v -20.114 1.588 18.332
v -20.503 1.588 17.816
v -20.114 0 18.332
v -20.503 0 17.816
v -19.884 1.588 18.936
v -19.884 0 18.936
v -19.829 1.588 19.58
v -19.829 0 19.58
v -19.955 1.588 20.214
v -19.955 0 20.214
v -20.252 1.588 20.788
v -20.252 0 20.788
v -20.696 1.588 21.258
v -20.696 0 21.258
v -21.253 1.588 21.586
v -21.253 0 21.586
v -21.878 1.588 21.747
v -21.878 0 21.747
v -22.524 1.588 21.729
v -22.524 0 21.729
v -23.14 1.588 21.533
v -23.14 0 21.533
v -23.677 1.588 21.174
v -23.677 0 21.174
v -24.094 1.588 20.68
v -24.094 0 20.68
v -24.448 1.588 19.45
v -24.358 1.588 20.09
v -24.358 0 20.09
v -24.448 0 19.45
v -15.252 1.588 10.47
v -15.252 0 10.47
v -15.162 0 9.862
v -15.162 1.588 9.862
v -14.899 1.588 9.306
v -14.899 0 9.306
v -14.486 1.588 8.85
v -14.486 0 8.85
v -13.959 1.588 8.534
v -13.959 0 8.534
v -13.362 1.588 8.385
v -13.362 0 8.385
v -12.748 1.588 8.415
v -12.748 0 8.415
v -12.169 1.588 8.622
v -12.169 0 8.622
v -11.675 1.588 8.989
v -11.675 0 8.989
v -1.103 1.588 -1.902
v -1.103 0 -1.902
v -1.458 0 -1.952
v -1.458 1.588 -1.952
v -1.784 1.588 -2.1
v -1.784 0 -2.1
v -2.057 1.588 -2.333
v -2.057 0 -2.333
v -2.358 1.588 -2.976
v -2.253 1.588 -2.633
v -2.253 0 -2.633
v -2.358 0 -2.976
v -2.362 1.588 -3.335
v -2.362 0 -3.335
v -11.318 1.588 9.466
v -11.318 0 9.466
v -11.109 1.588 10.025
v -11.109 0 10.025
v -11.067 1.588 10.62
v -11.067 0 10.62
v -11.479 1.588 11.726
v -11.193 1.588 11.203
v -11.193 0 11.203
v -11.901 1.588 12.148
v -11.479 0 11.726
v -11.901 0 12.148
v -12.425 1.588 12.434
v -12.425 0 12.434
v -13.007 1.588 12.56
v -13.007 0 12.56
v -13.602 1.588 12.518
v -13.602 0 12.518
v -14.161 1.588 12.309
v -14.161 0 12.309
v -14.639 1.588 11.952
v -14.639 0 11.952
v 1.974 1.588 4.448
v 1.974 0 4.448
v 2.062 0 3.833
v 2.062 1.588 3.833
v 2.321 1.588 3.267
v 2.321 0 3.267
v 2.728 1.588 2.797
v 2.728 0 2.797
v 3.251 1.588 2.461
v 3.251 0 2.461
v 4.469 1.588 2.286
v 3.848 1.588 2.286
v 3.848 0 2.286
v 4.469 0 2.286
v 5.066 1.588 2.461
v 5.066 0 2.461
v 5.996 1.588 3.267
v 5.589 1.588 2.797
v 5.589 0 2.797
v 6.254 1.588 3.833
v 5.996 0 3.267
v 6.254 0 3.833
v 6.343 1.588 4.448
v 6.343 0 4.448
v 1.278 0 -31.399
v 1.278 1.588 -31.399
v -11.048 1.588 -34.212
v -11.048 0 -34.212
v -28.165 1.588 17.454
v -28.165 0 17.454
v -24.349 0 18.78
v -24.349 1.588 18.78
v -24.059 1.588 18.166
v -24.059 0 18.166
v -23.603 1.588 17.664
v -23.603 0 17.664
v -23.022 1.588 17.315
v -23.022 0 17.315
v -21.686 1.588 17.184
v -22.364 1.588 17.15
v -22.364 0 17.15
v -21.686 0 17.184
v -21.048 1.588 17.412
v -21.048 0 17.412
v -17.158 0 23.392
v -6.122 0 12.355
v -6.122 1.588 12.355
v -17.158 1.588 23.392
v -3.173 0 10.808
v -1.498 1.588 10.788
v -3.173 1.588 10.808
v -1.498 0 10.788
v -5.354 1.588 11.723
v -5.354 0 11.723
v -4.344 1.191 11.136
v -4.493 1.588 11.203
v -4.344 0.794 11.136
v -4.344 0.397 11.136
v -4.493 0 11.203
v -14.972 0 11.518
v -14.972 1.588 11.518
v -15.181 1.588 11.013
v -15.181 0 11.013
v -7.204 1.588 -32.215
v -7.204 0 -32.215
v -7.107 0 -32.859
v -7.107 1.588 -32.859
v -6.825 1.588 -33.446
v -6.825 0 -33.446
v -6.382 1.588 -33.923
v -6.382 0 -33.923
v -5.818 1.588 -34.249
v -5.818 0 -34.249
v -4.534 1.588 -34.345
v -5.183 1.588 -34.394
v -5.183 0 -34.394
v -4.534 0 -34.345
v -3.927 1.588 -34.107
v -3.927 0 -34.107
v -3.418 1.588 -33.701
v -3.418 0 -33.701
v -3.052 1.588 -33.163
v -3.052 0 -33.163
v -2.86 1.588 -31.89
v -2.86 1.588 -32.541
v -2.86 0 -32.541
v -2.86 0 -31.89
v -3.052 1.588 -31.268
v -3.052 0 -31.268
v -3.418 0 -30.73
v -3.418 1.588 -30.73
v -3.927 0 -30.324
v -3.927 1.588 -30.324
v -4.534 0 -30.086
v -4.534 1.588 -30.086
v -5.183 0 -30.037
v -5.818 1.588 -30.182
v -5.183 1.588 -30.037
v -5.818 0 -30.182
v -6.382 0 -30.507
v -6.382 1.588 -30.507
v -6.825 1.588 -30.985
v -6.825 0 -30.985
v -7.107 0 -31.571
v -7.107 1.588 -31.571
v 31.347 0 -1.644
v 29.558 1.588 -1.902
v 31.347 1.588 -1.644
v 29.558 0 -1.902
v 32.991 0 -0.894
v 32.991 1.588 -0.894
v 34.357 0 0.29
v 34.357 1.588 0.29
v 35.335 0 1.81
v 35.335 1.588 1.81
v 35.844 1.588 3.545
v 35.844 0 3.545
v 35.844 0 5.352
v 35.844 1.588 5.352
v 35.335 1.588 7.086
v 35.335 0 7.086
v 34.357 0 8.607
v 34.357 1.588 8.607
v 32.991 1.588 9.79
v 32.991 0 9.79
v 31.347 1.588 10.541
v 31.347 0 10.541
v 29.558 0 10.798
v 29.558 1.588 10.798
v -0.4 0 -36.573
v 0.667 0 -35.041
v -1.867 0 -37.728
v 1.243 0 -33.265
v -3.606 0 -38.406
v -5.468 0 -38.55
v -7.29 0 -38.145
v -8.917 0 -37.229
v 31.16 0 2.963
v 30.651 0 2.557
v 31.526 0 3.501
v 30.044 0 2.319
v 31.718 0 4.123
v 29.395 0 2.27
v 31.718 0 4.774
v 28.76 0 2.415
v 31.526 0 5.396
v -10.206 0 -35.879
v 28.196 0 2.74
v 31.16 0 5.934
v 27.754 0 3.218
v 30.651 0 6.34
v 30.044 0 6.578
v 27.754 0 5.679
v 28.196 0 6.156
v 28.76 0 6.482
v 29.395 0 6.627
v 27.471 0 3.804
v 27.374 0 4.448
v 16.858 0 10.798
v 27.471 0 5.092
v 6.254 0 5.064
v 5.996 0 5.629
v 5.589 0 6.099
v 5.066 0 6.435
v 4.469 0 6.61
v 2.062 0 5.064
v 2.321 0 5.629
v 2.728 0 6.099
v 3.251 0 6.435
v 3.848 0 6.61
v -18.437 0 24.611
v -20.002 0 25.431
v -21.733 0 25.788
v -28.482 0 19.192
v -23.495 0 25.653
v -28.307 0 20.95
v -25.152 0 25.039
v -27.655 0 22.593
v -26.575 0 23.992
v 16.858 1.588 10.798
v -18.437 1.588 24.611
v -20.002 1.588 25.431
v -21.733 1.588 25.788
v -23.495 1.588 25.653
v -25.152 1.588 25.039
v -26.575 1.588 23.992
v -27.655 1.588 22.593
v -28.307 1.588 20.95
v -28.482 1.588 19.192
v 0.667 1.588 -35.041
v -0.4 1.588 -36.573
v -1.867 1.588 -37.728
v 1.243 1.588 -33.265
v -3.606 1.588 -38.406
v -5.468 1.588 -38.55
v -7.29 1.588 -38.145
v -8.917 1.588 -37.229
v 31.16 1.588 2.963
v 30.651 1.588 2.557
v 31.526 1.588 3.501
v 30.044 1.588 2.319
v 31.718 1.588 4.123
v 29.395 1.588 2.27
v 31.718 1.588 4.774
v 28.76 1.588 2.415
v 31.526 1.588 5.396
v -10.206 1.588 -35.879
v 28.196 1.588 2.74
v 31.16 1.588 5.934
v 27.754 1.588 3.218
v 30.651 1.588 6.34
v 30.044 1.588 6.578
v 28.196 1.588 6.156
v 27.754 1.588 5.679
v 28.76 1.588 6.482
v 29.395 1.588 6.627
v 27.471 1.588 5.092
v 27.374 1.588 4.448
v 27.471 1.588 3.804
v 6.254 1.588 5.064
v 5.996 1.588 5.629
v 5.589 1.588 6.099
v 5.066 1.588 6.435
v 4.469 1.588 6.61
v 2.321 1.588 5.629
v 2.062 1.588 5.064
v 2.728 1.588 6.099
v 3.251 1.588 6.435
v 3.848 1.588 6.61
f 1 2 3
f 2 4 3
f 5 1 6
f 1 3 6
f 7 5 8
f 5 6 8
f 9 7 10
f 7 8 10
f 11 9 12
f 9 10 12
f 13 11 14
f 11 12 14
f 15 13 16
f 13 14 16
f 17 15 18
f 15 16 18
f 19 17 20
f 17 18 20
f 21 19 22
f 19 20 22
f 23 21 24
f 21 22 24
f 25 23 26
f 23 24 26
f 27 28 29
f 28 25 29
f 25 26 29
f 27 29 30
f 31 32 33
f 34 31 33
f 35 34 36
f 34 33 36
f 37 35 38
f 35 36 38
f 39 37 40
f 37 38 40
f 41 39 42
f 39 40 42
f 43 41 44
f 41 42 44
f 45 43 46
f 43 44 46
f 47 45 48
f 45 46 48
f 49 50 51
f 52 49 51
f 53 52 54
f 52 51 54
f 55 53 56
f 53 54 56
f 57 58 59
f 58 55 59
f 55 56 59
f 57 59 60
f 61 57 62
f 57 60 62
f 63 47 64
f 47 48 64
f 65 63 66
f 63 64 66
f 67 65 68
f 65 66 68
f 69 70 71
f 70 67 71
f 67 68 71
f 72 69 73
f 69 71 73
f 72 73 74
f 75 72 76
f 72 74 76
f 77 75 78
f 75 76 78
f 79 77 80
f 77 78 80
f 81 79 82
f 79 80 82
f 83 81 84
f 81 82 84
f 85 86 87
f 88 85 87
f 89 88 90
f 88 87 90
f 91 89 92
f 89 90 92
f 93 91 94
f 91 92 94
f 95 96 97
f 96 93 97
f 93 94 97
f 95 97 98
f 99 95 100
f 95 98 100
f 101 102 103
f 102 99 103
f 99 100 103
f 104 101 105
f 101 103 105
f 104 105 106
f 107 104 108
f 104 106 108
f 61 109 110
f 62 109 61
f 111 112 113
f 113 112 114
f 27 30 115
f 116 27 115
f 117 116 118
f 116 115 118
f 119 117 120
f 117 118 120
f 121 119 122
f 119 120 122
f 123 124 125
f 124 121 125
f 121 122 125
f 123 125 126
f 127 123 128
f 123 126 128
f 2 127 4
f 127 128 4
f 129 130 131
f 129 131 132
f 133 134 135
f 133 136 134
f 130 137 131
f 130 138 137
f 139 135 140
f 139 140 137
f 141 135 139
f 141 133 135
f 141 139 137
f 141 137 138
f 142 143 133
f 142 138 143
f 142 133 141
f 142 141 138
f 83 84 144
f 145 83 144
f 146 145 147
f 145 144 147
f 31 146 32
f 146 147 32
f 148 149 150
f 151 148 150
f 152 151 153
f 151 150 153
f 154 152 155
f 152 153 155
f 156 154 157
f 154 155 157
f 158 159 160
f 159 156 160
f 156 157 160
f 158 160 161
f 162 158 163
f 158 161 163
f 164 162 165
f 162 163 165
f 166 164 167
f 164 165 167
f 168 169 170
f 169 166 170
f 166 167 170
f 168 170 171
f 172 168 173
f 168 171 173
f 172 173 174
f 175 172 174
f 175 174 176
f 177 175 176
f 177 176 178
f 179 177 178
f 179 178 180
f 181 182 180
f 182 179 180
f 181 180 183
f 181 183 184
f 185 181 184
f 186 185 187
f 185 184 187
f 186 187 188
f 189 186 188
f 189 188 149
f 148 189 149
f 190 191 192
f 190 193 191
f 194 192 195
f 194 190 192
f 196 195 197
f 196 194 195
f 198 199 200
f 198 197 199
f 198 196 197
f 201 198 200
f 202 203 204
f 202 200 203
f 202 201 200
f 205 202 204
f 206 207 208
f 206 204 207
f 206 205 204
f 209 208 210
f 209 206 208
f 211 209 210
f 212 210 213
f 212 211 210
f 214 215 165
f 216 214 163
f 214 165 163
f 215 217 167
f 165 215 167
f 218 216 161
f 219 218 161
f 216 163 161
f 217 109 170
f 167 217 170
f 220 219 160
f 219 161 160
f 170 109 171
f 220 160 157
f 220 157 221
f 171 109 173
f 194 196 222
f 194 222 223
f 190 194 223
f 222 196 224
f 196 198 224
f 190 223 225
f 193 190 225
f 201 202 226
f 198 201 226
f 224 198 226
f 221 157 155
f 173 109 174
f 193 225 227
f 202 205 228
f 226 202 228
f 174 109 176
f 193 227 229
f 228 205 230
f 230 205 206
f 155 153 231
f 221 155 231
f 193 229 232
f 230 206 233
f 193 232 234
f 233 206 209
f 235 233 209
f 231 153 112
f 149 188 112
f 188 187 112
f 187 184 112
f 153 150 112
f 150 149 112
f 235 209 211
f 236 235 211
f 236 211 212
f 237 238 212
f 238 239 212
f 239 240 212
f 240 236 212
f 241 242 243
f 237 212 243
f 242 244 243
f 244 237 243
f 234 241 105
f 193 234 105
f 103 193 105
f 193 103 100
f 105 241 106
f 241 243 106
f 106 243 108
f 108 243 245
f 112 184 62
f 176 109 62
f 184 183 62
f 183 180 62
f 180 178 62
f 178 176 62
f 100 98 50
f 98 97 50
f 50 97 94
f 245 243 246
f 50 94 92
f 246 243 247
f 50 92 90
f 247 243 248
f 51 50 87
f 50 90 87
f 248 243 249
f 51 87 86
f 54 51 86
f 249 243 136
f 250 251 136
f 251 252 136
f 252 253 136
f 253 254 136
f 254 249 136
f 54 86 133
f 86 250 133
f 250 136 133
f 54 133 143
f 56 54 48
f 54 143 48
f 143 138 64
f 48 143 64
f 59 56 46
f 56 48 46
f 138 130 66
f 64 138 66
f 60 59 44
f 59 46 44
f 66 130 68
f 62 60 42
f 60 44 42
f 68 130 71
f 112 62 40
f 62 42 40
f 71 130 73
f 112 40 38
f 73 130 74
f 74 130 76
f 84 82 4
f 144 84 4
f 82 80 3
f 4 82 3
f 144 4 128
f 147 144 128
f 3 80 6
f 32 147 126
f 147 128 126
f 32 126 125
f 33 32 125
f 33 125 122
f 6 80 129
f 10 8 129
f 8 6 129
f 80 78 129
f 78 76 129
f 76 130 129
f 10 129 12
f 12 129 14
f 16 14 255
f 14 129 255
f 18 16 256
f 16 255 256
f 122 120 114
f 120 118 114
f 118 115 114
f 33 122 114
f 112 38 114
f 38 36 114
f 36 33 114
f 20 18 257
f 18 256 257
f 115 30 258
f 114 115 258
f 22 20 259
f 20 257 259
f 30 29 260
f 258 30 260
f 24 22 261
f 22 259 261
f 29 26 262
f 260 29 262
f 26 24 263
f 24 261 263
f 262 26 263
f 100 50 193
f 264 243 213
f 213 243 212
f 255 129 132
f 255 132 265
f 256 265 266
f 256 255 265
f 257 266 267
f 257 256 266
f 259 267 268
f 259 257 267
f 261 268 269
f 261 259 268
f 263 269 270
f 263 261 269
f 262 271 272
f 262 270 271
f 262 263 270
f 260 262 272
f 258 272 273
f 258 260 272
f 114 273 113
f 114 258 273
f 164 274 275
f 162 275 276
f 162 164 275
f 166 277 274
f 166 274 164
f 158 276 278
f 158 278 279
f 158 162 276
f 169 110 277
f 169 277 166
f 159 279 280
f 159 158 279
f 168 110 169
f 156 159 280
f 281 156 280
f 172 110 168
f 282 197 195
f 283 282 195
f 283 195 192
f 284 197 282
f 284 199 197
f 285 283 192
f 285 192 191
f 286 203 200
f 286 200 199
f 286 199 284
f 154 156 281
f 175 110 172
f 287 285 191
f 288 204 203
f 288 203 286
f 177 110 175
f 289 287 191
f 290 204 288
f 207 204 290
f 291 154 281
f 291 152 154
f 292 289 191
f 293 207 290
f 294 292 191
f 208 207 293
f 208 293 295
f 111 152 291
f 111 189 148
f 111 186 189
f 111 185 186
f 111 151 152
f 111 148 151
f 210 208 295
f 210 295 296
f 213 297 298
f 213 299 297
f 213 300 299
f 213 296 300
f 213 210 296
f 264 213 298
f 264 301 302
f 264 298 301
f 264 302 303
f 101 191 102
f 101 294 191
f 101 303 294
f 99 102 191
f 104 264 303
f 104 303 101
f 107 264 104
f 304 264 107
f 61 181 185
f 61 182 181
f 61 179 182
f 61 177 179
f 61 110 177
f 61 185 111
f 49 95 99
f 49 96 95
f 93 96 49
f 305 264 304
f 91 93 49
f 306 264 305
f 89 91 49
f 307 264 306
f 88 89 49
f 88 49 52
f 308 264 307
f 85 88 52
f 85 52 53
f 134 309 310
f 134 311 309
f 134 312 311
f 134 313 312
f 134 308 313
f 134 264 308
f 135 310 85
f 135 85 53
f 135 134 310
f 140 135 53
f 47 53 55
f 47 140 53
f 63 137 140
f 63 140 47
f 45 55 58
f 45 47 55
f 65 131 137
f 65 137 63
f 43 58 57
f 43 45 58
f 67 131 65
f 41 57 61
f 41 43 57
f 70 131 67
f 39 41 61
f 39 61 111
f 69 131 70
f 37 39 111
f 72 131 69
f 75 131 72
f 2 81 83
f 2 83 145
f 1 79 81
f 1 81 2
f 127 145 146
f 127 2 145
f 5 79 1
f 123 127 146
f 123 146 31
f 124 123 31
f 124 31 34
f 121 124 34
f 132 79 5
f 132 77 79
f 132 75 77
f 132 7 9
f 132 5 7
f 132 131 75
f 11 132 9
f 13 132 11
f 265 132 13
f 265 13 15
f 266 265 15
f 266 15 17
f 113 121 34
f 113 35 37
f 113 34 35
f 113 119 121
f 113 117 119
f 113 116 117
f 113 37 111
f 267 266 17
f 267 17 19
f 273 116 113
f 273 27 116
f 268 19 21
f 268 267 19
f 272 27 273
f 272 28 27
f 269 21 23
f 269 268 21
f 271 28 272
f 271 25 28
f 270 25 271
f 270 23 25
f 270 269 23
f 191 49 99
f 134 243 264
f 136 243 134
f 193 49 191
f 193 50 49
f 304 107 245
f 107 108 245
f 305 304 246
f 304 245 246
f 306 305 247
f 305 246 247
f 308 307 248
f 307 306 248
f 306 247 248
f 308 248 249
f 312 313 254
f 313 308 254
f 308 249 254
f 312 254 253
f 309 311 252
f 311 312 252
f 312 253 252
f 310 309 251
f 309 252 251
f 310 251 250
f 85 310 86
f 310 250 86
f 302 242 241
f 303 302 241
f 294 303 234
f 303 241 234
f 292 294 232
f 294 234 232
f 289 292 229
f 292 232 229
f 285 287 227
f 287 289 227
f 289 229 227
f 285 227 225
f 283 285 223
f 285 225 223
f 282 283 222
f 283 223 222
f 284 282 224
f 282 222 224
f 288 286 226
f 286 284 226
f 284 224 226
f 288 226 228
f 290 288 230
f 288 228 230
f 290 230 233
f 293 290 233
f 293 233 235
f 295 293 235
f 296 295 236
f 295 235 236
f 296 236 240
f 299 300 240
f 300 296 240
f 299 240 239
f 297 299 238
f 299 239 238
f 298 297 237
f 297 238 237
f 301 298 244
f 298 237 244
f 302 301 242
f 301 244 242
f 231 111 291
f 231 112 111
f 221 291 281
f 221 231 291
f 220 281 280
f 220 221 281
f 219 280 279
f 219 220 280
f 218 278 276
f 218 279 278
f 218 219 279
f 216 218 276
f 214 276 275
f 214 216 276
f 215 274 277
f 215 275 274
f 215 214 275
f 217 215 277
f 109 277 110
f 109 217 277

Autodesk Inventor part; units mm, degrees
ref_plane "YZ Plane" through (0, 0, 0) normal (1, 0, 0) x (0, 1, 0)
ref_plane "XZ Plane" through (0, 0, 0) normal (0, 1, 0) x (-1, 0, 0)
ref_plane "XY Plane" through (0, 0, 0) normal (0, 0, 1) x (1, 0, 0)
sketch "main" plane through (0, 0, 0) normal (0, 0, 1) x (1, 0, 0)
  circle A0 centre (38.7007, 32.2161) radius 2.3114
  circle A1 centre (29.7205, 23.2358) radius 2.3114
  circle A2 centre (13.1029, 17.5349) radius 2.1844
  circle A3 centre (22.281, -19.1287) radius 2.1844
  circle A4 centre (22.281, -19.1287) radius 6.35
  spline S0 degree 3 poles (34.2106, 36.7062) (34.5464, 37.0421) (35.2145, 37.7033) (36.4253, 38.4715) (37.8969, 38.8878) (39.5045, 38.8877) (40.9769, 38.4718) (42.187, 37.7033) (42.855, 37.0421) (43.1908, 36.7062) knots 0 0 0 0 0.123366 0.246731 0.370097 0.493463 0.616828 0.740194 0.86356 0.86356 0.86356 0.86356
  spline S1 degree 3 poles (43.1908, 36.7062) (43.5267, 36.3703) (44.188, 35.7023) (44.9562, 34.4914) (45.3725, 33.0199) (45.3723, 31.4123) (44.9564, 29.9399) (44.1879, 28.7298) (43.5267, 28.0618) (43.1908, 27.7259) knots 0 0 0 0 0.123366 0.246731 0.370097 0.493463 0.616828 0.740194 0.86356 0.86356 0.86356 0.86356
  line L0 (28.3198, -21.092) -> (45.0845, 30.4731)
  line L1 (16.2421, -17.1653) -> (28.0767, 19.2357)
  line L2 (24.0195, 11.1849) -> (0.4029, 11.1849)
  spline S2 degree 3 poles (28.5097, 13.0448) (28.2578, 12.7929) (27.7518, 12.2921) (26.7458, 11.6097) (25.4482, 11.197) (24.4945, 11.1849) (24.0195, 11.1849) knots 0 0 0 0 0.214286 0.428571 0.714286 1 1 1 1
  point P0 (28.3293, 11.5879)
  dimension "d0" = 12.7
sketch "Sketch1" plane through (0, 0, 0) normal (0, 1, 0) x (-1, 0, 0)
  circle A0 centre (22.1371, 19.4505) radius 2.3114
  circle A1 centre (-4.1584, 4.4483) radius 2.1844
  circle A2 centre (5.0197, -32.2153) radius 2.1844
  arc A3 (-1.2776, -31.3986) -> (11.0475, -34.2123) centre (5.0197, -32.2153) ccw
  line L0 (11.0475, -34.2123) -> (28.1648, 17.4535)
  line L1 (-1.2776, -31.3986) -> (2.3621, -3.335)
  line L2 (1.1026, -1.9017) -> (-29.5584, -1.9017)
  line L3 (6.1217, 12.3553) -> (17.1581, 23.3917)
  spline S0 degree 3 poles (1.4978, 10.7883) (1.9739, 10.7568) (2.9306, 10.7058) (4.2586, 11.0336) (5.3122, 11.651) (5.8525, 12.1194) (6.1217, 12.3553) knots 0 0 0 0 0.285714 0.571429 0.785714 1 1 1 1
  line L4 (-16.8584, 10.7983) -> (1.4978, 10.7883)
  arc A4 (2.3621, -3.335) -> (1.1026, -1.9017) centre (1.1026, -3.1717) ccw
  line L5 (-16.8584, 10.7983) -> (-29.5584, 10.7983)
  circle A5 centre (-29.5584, 4.4483) radius 2.1844
  arc A6 (28.1648, 17.4535) -> (17.1581, 23.3917) centre (22.1371, 19.4505) ccw
  arc A7 (-29.5584, 10.7983) -> (-29.5584, -1.9017) centre (-29.5584, 4.4483) ccw
  circle A8 centre (13.1568, 10.4703) radius 2.0955
  line L6 (-29.5584, 4.4483) -> (7.1348, 4.4483)
  line L7 (7.1348, 4.4483) -> (22.1371, 19.4505)
  dimension "d2" = 12.7
  dimension "d3" = 1.27
  dimension "d10" = 6.35
  dimension "d15" = 135
extrude "Extrusion1" add sketch "Sketch1" along normal blind 1.5875
equation "\"BendRadius\" = Thickness"
equation "\"BendReliefWidth\" = Thickness"
equation "\"BendReliefDepth\" = 0.5 * Thickness"
equation "\"CornerReliefSize\" = 4 * Thickness"
equation "\"MinimumRemnant\" = 2 * Thickness"
equation "\"TransitionRadius\" = BendRadius"
equation "\"JacobiRadiusSize\" = BendRadius"
equation "\"GapSize\" = Thickness"
equation "\"Thickness\" = 3.048"
properties part number "join-gusset_offset" material "Acetal Resin, Black"
